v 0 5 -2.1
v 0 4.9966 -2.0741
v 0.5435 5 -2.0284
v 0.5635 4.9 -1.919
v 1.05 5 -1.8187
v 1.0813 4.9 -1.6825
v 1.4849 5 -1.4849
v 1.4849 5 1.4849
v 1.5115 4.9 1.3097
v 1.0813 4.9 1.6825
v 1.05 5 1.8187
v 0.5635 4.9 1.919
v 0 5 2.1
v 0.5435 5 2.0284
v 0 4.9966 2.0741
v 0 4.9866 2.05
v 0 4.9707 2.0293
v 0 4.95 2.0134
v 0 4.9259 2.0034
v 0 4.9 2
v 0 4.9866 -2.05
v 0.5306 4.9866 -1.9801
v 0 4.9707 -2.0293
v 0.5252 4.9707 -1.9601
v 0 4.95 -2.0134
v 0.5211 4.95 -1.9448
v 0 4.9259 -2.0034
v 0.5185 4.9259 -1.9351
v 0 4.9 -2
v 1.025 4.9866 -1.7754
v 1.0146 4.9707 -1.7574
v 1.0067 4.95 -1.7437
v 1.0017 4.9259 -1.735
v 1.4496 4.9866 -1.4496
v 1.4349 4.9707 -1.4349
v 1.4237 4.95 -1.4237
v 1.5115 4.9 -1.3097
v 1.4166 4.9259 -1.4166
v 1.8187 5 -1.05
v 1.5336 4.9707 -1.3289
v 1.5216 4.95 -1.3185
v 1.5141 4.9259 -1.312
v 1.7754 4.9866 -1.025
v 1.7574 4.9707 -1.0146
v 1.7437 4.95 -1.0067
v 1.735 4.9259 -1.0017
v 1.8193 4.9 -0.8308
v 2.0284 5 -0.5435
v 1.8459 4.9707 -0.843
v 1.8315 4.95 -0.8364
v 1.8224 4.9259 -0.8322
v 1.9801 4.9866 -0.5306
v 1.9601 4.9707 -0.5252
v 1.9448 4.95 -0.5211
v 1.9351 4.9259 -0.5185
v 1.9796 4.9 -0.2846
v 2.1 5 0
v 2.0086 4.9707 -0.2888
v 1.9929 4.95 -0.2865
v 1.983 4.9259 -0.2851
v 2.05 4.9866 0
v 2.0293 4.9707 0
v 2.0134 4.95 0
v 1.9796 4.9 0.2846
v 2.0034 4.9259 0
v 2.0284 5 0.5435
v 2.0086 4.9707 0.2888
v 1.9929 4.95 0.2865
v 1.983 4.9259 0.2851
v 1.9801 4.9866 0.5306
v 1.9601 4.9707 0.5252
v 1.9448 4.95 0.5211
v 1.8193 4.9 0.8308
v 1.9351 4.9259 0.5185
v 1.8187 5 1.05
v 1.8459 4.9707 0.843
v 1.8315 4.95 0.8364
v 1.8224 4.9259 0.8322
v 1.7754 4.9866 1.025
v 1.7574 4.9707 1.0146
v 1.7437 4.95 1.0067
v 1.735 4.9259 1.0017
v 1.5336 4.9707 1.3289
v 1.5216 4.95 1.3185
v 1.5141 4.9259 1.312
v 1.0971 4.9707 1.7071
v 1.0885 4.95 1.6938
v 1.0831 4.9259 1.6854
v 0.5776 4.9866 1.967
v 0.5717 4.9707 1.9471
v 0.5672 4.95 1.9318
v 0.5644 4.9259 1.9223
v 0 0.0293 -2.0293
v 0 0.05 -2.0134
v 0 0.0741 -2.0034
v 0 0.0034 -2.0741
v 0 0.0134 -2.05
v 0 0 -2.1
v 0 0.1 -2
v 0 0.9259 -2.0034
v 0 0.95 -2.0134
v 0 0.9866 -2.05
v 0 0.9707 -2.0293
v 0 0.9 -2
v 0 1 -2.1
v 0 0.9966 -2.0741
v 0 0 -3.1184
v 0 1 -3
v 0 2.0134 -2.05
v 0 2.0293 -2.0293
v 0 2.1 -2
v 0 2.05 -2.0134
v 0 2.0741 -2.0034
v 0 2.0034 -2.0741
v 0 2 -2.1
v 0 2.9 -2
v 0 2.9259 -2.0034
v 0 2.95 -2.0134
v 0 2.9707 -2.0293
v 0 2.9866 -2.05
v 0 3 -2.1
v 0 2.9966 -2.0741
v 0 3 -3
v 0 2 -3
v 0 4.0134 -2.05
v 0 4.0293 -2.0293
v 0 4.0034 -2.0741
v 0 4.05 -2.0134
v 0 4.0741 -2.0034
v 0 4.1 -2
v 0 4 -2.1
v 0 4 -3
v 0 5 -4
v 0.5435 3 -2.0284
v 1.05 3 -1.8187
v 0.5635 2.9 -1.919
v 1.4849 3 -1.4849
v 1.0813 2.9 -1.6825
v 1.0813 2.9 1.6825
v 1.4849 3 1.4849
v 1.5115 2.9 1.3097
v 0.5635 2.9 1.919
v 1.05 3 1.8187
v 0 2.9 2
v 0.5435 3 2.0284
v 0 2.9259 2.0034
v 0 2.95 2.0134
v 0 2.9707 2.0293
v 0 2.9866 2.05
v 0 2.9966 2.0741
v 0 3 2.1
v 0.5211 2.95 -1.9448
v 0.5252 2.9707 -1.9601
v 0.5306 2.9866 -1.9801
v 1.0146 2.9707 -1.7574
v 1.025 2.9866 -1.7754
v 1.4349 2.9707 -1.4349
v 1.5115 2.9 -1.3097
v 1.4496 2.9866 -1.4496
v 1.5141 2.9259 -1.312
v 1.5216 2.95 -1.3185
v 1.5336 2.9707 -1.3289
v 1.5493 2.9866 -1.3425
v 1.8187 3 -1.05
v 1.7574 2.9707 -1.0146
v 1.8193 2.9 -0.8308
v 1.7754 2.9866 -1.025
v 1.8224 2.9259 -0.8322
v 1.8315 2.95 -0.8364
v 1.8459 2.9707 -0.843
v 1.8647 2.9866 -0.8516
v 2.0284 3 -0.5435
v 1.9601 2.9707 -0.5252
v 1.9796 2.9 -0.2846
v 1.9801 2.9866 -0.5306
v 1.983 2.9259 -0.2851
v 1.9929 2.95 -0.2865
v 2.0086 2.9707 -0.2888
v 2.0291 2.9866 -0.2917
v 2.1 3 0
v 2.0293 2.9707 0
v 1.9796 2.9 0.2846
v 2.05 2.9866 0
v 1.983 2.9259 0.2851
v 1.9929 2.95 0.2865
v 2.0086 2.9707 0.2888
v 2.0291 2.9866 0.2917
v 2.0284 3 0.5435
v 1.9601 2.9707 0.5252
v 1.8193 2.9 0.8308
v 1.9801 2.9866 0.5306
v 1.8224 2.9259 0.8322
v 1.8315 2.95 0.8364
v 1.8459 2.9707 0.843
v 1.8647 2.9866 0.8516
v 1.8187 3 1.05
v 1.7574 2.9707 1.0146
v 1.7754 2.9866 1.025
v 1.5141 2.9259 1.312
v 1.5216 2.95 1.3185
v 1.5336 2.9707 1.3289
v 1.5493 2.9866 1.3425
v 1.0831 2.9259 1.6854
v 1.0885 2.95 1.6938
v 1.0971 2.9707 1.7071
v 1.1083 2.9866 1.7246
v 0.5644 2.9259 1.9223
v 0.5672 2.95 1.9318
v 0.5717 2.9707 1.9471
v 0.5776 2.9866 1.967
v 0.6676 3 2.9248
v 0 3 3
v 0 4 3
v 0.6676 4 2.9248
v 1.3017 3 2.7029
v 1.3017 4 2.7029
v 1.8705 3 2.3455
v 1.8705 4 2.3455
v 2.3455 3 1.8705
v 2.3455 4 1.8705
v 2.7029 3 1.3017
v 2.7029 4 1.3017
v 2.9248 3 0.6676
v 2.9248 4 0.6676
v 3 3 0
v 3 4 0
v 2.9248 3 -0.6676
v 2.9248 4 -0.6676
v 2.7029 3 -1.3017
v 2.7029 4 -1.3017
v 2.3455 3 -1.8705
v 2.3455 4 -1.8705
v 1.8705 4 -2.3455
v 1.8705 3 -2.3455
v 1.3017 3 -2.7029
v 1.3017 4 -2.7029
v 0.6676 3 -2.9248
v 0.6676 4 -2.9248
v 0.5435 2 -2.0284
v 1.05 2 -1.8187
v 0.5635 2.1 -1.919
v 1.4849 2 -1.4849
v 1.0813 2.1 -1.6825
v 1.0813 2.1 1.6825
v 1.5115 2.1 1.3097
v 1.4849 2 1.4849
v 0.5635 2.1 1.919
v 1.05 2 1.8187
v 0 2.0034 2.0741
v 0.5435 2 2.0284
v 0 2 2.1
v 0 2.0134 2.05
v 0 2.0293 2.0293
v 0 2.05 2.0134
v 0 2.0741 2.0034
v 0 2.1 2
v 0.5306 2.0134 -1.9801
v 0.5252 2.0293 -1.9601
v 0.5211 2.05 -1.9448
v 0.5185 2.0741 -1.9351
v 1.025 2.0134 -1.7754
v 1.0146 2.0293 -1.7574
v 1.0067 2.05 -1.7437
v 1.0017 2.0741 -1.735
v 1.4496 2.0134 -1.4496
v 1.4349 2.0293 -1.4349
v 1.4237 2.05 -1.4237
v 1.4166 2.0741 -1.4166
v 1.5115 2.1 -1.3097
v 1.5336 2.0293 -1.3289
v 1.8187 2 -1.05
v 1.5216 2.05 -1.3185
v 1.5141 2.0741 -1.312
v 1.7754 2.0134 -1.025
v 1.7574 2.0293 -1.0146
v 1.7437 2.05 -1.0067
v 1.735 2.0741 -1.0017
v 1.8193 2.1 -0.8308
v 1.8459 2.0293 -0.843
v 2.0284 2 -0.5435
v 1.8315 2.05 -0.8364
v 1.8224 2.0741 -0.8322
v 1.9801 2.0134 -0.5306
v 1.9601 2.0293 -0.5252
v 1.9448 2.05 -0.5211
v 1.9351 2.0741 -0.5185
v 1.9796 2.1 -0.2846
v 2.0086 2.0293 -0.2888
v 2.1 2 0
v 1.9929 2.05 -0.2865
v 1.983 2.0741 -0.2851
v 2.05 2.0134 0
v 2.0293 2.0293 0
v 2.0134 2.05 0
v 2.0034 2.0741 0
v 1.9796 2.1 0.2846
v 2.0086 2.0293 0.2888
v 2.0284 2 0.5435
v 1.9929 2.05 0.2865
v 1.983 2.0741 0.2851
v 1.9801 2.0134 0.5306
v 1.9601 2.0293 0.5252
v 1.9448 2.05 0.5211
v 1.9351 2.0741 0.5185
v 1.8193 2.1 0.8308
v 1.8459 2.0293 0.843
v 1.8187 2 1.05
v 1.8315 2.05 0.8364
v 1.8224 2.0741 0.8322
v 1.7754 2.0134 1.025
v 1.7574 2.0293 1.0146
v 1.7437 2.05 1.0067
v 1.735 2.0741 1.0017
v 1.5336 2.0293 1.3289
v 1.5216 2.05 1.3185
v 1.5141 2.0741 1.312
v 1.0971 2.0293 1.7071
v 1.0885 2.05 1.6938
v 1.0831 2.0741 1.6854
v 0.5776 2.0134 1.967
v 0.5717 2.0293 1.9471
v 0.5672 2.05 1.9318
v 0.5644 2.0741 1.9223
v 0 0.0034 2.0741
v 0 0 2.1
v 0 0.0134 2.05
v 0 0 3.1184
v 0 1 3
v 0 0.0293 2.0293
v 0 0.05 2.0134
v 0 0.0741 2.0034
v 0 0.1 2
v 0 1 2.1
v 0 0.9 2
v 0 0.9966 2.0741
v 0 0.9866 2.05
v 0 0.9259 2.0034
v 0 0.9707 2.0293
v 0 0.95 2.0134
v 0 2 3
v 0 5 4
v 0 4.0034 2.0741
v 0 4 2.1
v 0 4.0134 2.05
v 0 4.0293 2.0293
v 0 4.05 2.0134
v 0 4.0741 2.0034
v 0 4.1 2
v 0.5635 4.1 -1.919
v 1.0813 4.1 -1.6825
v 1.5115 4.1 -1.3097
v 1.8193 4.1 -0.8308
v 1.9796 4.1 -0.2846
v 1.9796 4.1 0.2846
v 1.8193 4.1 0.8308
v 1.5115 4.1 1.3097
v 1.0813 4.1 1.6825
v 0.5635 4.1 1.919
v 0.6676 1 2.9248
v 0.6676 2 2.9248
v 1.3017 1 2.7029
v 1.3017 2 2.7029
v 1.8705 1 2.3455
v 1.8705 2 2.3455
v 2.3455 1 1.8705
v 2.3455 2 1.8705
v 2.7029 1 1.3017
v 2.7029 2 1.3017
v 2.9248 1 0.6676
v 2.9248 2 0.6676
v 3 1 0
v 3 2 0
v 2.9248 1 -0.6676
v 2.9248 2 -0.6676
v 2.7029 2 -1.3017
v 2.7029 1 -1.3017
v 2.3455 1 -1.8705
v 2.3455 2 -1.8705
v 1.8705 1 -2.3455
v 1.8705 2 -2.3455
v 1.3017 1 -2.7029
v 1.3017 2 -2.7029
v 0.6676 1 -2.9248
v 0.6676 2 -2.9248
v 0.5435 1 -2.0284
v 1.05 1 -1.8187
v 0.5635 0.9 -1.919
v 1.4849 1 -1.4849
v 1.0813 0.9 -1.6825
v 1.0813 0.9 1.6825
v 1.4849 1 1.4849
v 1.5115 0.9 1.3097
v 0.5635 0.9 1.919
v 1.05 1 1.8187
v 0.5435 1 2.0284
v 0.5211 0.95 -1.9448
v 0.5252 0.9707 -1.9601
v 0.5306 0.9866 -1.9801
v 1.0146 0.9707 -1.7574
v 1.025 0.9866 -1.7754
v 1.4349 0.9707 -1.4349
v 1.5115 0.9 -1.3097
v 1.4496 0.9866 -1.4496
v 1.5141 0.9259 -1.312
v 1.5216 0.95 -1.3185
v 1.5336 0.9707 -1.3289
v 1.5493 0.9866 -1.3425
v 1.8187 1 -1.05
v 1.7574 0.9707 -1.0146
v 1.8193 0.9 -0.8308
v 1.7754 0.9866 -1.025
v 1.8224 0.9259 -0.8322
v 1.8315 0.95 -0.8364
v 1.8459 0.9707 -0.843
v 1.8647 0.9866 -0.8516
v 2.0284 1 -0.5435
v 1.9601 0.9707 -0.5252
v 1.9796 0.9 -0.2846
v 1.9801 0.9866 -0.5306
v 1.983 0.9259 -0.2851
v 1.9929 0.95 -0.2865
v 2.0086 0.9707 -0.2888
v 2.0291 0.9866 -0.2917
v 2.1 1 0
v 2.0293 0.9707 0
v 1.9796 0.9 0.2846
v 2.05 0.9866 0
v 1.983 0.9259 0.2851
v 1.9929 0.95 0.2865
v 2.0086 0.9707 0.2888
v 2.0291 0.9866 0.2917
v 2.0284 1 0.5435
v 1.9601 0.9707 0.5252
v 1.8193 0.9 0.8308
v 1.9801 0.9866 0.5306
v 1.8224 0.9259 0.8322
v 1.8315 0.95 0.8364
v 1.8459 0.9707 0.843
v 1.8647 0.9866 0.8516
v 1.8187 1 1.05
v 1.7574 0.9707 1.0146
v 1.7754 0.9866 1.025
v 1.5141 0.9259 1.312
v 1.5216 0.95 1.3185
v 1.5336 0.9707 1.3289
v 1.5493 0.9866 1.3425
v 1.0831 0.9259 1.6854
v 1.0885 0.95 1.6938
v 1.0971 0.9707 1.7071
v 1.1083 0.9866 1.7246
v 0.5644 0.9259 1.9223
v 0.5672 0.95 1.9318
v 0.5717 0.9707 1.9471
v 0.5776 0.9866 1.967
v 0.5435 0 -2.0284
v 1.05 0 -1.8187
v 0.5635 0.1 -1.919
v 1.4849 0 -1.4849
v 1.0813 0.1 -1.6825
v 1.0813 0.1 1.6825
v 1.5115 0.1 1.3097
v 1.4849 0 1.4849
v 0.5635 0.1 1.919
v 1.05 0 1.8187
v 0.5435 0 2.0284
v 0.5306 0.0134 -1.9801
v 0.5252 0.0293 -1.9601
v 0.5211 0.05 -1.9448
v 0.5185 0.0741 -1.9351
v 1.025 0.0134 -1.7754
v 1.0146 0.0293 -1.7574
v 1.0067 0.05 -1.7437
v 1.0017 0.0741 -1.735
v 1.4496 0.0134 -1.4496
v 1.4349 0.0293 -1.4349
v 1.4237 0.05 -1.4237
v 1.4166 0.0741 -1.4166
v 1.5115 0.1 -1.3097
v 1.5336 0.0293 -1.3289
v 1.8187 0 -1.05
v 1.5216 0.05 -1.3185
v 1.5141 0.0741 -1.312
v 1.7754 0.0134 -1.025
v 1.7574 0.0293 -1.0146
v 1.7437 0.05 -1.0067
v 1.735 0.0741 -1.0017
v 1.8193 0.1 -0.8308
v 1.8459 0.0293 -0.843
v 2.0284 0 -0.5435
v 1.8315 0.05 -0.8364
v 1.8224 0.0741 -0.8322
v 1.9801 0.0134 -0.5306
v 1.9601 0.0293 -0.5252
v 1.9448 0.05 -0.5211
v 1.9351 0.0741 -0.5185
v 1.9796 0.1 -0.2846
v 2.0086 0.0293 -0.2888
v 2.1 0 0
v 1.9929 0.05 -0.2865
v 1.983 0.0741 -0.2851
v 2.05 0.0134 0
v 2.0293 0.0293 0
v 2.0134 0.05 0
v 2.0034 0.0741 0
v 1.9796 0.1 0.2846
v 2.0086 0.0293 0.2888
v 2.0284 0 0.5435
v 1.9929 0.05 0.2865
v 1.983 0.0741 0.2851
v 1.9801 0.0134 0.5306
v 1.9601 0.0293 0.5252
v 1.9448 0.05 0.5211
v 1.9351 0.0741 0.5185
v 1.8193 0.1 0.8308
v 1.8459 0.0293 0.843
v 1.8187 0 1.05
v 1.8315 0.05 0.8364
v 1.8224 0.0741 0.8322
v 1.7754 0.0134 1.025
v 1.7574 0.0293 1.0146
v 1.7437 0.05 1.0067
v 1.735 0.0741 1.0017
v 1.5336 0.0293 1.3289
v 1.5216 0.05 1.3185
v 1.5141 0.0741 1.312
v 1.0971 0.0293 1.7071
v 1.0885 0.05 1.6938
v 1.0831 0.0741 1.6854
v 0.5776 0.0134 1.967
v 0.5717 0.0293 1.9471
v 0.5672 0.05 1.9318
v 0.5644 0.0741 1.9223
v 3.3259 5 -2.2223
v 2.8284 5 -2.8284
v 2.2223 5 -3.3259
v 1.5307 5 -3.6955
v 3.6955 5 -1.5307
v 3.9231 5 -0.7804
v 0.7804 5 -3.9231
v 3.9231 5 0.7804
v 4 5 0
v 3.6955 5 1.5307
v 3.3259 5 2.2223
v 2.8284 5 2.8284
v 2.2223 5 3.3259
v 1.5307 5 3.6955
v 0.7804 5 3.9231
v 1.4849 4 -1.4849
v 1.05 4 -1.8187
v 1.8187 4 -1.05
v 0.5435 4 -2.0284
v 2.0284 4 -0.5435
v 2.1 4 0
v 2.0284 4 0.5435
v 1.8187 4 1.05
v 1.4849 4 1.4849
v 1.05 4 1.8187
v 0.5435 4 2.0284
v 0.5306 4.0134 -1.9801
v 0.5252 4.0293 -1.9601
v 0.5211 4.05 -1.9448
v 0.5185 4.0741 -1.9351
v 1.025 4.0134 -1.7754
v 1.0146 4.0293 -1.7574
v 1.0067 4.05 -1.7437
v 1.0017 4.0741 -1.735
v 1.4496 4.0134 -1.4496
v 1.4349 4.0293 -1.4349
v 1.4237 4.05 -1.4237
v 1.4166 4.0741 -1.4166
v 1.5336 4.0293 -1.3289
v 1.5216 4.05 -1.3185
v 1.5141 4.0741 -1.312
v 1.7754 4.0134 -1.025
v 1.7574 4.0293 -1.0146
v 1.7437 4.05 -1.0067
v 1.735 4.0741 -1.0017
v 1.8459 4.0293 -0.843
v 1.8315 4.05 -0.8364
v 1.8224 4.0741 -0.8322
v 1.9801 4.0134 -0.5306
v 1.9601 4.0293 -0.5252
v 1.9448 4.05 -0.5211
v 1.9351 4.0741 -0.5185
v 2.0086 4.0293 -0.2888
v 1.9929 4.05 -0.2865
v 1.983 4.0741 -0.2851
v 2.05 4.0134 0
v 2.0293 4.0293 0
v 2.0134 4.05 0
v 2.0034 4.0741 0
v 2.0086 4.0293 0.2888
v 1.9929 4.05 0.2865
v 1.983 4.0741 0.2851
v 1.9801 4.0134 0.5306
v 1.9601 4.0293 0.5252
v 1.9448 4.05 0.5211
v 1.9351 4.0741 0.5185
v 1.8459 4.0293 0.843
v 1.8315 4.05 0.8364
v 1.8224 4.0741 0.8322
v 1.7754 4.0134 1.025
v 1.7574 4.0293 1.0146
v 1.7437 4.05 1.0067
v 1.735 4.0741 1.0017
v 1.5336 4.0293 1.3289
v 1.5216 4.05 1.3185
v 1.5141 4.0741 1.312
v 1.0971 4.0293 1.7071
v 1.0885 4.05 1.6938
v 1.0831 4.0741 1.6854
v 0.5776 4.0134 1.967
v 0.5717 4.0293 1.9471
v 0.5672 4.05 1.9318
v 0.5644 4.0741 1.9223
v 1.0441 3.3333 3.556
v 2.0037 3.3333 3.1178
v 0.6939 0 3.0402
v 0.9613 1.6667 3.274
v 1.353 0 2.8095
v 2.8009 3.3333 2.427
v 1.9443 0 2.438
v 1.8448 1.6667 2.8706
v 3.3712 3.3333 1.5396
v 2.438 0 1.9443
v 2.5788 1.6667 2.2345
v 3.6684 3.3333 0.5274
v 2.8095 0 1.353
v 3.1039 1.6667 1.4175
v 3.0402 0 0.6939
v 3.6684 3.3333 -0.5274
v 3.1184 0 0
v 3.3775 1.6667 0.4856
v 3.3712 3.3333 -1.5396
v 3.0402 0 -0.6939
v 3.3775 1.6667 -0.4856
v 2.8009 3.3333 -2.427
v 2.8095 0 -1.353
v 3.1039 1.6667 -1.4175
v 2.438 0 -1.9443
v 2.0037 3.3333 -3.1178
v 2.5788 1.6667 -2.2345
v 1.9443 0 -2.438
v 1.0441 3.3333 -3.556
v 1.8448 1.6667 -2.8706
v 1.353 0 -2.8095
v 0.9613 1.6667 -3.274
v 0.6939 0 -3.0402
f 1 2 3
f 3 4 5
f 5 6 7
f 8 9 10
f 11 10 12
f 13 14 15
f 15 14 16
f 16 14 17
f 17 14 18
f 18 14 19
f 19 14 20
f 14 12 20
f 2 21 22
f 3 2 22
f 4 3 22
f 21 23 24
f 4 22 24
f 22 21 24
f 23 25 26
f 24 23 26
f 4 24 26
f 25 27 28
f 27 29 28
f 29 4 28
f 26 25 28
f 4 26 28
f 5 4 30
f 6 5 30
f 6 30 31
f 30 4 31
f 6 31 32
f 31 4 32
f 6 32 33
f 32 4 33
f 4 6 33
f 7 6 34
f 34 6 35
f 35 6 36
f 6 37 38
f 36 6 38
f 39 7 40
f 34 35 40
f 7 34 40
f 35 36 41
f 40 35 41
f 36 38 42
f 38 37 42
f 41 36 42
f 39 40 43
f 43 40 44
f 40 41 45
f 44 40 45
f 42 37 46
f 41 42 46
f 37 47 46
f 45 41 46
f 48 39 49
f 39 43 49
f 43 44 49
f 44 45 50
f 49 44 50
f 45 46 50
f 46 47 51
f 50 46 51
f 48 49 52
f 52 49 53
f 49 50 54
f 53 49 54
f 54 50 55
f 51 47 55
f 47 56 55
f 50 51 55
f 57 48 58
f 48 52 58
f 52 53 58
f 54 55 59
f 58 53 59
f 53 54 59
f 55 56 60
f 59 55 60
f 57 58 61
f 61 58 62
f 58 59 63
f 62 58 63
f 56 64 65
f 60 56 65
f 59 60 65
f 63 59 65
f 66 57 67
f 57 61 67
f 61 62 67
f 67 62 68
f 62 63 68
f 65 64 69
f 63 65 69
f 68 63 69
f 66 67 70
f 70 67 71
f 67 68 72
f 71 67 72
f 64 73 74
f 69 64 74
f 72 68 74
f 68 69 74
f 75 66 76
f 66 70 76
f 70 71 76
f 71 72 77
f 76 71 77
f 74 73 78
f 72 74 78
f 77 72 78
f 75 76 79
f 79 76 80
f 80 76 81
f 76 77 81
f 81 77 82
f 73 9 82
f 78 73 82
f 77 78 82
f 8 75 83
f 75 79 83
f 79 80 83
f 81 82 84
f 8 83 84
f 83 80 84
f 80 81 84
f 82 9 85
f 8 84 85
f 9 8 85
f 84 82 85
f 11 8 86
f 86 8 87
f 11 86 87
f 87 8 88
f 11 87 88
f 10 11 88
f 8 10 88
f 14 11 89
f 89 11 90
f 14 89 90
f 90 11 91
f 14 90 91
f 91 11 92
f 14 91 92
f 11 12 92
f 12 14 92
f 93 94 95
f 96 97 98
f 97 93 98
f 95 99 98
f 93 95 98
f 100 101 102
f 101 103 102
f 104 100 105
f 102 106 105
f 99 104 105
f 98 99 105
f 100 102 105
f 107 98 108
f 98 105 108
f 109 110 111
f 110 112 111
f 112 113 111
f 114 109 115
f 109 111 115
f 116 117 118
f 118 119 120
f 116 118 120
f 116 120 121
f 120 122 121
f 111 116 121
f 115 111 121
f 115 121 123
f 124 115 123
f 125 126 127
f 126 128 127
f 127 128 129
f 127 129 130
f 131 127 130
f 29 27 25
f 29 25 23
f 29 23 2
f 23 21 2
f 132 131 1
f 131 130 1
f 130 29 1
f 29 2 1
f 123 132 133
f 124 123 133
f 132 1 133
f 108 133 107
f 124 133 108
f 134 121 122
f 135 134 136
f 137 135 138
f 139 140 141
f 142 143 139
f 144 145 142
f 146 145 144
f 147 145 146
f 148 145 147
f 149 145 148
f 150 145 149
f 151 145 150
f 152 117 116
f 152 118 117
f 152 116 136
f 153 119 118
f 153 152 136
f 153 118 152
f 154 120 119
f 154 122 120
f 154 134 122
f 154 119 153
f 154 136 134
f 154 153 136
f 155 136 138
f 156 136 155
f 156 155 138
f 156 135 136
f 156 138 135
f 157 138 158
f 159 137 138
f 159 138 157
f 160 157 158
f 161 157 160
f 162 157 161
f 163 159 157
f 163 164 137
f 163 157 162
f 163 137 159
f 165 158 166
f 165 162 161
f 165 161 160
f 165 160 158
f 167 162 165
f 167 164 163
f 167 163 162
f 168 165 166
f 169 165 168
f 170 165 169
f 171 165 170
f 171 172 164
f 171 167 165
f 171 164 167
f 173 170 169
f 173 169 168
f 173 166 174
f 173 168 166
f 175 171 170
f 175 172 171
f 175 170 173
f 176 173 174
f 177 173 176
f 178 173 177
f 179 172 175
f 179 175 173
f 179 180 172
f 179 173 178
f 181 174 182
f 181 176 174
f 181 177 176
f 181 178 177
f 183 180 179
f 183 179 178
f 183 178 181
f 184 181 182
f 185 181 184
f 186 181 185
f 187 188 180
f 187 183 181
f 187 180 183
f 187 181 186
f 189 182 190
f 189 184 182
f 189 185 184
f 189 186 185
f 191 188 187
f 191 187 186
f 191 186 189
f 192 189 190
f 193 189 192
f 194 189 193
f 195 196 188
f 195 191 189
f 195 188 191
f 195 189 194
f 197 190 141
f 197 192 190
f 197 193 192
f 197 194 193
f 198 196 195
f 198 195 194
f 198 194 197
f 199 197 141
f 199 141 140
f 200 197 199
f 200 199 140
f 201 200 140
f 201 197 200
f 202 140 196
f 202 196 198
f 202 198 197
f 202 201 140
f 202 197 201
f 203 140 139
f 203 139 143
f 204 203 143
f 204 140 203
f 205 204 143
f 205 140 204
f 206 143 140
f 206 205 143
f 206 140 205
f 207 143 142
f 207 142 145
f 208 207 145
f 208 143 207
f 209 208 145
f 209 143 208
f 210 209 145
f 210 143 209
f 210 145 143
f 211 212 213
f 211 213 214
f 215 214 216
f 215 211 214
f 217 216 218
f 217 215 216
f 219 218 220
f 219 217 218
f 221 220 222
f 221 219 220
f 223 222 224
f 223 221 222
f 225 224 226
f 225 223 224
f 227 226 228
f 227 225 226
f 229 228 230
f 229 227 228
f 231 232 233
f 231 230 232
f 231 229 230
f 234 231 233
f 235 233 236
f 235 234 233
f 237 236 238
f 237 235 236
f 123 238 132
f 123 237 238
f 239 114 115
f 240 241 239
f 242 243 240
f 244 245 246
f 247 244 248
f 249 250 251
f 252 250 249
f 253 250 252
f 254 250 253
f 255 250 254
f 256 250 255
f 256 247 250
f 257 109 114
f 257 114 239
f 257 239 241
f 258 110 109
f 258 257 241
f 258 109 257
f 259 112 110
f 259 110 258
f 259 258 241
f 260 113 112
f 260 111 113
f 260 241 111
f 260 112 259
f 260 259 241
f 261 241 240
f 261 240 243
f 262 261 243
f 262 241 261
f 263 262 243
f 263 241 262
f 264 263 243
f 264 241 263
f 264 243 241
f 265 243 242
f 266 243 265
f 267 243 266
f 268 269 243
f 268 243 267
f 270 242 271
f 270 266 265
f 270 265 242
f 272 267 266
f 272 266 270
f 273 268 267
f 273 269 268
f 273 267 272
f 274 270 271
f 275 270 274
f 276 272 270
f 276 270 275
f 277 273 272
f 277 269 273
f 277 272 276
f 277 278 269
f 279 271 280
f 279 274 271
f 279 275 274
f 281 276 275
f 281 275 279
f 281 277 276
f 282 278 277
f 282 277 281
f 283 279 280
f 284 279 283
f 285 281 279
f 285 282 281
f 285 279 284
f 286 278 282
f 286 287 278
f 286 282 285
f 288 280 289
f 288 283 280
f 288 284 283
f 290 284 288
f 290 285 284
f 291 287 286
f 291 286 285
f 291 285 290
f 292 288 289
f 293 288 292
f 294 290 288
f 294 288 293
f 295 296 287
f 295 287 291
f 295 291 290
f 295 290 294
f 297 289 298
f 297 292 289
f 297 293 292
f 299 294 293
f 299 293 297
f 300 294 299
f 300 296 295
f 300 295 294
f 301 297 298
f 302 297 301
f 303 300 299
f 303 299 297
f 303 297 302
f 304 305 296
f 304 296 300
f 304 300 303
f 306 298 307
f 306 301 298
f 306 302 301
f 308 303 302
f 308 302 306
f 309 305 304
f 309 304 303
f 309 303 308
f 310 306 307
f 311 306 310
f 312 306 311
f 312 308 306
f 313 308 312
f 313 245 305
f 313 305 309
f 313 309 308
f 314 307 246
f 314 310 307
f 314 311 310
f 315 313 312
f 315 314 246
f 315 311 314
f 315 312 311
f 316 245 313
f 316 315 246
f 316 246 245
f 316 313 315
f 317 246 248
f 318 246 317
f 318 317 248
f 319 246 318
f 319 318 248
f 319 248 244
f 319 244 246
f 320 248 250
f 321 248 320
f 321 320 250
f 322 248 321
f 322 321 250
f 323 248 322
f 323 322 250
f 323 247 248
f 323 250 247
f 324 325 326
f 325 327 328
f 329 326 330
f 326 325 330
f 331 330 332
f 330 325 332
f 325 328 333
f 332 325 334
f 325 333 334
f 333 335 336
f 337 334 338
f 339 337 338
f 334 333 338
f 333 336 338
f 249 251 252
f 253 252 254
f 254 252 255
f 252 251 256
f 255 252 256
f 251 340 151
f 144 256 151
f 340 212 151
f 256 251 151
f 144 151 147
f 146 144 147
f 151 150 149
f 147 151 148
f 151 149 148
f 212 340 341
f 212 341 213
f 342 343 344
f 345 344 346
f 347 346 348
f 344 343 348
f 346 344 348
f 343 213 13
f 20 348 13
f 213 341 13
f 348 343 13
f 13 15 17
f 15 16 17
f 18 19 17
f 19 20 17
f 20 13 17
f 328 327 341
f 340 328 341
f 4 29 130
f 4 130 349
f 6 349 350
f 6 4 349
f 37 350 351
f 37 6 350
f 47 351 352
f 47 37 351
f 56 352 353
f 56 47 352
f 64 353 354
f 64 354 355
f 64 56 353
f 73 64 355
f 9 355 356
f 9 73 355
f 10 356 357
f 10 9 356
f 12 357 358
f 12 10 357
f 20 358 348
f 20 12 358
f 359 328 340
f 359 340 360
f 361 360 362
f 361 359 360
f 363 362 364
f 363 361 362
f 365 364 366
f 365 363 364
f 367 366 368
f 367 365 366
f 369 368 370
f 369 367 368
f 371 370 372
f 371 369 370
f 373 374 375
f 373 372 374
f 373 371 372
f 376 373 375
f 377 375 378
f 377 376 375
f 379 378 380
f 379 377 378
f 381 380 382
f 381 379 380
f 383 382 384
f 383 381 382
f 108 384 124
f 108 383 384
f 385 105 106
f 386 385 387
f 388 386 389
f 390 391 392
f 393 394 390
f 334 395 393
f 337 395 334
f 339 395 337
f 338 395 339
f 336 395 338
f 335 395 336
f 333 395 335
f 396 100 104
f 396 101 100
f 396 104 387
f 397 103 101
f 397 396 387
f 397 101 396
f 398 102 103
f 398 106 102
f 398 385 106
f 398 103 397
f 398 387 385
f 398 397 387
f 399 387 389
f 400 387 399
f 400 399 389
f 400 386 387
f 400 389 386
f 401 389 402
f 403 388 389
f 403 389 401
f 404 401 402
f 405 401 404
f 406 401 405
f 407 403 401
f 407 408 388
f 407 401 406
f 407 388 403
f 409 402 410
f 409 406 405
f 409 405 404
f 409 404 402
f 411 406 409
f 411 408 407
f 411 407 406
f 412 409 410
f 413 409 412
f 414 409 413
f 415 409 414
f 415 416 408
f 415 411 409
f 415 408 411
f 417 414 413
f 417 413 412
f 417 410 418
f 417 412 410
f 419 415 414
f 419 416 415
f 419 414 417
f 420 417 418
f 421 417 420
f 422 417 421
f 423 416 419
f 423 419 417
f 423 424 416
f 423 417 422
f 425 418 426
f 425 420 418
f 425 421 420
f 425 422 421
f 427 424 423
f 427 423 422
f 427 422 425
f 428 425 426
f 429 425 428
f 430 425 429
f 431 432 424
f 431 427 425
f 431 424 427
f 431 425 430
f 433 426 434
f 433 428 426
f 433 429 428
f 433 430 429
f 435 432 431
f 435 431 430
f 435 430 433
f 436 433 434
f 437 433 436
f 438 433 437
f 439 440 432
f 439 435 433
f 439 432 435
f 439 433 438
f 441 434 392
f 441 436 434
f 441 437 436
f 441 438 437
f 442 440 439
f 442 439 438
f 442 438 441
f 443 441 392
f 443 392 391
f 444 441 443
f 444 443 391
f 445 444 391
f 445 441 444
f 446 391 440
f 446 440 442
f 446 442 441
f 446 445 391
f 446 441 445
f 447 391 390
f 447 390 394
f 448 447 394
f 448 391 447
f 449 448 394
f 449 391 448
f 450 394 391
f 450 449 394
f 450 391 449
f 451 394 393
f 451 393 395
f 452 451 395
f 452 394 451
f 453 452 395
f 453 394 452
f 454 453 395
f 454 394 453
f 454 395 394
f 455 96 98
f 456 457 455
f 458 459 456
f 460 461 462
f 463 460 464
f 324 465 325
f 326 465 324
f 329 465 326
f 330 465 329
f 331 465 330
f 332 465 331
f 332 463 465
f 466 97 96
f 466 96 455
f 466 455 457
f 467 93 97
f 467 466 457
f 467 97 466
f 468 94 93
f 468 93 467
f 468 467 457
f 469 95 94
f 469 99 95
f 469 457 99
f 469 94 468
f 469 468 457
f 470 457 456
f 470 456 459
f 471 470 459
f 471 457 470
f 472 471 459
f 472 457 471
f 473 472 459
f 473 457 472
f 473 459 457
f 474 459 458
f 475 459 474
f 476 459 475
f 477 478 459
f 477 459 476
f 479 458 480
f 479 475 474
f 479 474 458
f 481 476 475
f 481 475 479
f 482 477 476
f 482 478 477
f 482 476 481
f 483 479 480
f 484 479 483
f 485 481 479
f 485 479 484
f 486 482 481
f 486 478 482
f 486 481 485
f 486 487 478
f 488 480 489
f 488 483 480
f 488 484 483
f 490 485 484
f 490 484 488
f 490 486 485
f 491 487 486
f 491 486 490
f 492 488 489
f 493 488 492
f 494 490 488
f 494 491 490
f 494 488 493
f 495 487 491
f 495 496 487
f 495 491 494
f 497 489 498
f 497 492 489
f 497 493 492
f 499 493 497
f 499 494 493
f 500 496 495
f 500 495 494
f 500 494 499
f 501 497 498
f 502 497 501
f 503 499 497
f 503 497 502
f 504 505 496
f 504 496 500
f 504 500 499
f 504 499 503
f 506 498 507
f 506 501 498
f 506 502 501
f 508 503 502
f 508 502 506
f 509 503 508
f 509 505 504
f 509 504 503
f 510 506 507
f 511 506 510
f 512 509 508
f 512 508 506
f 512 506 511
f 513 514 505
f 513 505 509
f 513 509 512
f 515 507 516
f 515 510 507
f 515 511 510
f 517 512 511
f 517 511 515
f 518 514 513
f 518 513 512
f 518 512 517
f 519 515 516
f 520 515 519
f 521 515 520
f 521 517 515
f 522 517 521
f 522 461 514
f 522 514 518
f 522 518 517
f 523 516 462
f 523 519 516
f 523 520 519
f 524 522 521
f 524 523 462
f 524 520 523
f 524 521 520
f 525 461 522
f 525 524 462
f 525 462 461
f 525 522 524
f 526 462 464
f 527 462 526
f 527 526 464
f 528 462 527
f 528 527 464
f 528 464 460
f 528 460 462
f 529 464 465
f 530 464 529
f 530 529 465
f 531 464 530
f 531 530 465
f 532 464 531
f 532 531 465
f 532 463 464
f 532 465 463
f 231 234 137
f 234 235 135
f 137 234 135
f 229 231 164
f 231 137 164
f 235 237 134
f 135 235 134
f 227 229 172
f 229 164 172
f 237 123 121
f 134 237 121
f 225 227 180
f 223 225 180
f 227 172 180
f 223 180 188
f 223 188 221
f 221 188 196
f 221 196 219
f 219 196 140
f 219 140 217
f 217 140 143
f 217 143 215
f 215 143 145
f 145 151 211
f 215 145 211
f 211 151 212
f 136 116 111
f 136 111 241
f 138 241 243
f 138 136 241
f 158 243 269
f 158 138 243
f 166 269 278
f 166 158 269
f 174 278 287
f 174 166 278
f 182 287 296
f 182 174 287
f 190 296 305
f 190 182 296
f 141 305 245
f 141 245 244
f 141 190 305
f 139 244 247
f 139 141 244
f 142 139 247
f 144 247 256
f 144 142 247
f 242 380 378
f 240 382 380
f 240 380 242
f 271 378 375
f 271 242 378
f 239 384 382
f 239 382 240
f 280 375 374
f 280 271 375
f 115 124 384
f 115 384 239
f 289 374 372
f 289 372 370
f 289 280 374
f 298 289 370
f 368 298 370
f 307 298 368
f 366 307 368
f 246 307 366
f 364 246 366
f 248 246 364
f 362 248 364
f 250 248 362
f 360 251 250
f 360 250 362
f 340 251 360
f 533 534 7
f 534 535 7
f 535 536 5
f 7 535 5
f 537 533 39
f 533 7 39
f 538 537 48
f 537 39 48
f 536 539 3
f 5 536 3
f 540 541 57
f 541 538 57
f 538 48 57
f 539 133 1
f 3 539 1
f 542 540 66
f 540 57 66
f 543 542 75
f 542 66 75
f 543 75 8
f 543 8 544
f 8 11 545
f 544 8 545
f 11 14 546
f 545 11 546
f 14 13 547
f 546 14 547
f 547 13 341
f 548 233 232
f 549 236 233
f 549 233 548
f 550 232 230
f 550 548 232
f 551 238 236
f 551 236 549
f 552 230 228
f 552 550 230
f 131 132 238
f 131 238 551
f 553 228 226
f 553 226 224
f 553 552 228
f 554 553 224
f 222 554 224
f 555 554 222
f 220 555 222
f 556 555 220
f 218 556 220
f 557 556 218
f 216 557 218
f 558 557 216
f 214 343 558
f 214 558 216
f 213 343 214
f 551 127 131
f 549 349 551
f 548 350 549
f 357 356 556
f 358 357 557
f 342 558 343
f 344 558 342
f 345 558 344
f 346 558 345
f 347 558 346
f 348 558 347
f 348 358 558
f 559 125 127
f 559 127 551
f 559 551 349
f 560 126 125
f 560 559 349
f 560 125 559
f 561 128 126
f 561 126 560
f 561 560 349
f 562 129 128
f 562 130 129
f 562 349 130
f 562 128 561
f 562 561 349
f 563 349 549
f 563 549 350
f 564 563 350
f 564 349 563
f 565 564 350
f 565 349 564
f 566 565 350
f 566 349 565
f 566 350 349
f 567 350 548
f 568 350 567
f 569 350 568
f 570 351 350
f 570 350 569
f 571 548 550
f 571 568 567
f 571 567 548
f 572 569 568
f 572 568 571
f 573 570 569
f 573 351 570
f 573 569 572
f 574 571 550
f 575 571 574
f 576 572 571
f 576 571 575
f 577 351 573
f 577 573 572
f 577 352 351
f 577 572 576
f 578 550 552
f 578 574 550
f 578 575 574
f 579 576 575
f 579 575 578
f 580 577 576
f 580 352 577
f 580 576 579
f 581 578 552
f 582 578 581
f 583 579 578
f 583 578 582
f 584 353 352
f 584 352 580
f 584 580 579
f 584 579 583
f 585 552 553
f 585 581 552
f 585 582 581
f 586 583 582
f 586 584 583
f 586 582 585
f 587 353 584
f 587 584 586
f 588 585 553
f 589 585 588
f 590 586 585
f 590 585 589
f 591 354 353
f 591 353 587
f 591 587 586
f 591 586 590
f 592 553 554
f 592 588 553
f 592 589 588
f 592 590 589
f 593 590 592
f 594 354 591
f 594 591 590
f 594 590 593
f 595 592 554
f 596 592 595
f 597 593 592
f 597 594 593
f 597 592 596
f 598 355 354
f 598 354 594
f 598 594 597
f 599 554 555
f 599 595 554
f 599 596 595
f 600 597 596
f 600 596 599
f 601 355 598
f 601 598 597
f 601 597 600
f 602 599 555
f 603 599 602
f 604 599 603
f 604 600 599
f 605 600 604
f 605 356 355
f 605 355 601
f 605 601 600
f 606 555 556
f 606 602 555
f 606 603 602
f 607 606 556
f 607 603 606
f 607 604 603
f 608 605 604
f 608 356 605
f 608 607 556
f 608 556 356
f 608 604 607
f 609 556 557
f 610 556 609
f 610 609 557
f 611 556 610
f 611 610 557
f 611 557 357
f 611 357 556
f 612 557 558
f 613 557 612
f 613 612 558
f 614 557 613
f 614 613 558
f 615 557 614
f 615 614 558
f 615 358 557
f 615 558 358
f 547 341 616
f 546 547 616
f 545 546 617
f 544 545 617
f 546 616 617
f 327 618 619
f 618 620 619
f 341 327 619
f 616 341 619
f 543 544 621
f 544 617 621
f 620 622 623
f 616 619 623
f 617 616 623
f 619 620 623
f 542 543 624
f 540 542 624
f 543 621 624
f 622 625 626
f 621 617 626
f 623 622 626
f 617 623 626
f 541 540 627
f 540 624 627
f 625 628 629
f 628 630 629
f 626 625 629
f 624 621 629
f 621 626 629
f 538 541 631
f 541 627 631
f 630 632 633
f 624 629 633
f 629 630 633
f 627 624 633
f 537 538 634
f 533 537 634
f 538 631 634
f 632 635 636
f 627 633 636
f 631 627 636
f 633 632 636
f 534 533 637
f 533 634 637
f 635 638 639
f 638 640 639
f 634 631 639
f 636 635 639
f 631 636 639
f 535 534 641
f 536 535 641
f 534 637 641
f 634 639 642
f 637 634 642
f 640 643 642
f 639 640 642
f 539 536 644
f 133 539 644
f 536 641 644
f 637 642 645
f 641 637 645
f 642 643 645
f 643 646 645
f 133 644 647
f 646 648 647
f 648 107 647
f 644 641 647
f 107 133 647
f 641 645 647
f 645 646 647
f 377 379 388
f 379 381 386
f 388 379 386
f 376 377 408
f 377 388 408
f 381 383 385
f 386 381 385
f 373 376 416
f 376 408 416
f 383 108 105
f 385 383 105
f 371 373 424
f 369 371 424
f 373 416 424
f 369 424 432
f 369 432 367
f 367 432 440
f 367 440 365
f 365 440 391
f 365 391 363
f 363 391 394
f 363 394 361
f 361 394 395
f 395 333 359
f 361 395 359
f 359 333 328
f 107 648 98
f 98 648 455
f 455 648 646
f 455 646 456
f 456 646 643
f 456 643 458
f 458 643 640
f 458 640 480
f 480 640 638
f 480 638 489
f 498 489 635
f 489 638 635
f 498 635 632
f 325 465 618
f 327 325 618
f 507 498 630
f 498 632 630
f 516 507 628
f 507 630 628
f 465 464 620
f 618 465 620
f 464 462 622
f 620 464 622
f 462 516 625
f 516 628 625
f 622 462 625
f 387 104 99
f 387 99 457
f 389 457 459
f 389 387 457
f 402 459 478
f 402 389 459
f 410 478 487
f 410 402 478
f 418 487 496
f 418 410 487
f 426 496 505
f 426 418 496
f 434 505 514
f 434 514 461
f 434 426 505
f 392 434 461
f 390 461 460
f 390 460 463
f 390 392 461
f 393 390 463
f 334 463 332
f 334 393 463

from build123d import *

# Parameters (mm, degrees)
SKETCH1_R           = 4
SKETCH1_R_2         = 3
BOSS_EXTRUDE1_DEPTH = 5
SKETCH2_W           = 1
SKETCH2_H           = 1
FILLET1_R           = 0.1


# Read off the part's stored shape, not the designer's step: Cut-Revolve-Thin1, Body-Delete/Keep 1
with BuildPart() as part:
    # Sketch1 → Boss-Extrude1 (new body)
    with BuildSketch(Plane(origin=(0, 0, 0), x_dir=(1, 0, 0), z_dir=(0, 1, 0))):
        with Locations(Location((0, 0, 0), (0, 0, 270))):
            Circle(SKETCH1_R)
        with Locations(Location((0, 0, 0), (0, 0, 270))):
            Circle(SKETCH1_R_2, mode=Mode.SUBTRACT)
    extrude(amount=BOSS_EXTRUDE1_DEPTH)

    # Sketch2 → Revolve1 (revolve)
    with BuildSketch(Plane.XY, mode=Mode.PRIVATE) as revolve1_sk:
        with Locations((-2.5, 4.5)):
            Rectangle(SKETCH2_W, SKETCH2_H)
        with Locations((-2.5, 2.5)):
            Rectangle(SKETCH2_W, SKETCH2_H)
        with Locations((-2.5, 0.5)):
            Rectangle(SKETCH2_W, SKETCH2_H)
    revolve(revolve1_sk.sketch.rotate(Axis((0, 5, 0), (0, -1, 0)), 270), axis=Axis((0, 5, 0), (0, -1, 0)))

    # Cut-Revolve-Thin1 outline → Cut-Revolve-Thin1 (revolve, cut)
    with BuildSketch(Plane.XY):
        Polygon((3.118365096, 0), (3.219907758, 0), (4, 4.424122952), (4, 5), align=None)
    revolve(axis=Axis((0, 0, 0), (0, 1, 0)), mode=Mode.SUBTRACT)

    # Body-Delete/Keep 1 outline → Body-Delete/Keep 1 (revolve, cut)
    with BuildSketch(Plane.XY):
        Polygon((4, 4.424122952), (3.219907758, 0), (4, 0), align=None)
    revolve(axis=Axis((0, 0, 0), (0, 1, 0)), mode=Mode.SUBTRACT)

    # SurfaceCut1
    split(bisect_by=Plane(origin=(0, 0, 0), x_dir=(0, 0, -1), z_dir=(1, 0, 0)), keep=Keep.TOP)

    # Fillet1
    fillet1_edges = [part.edges().sort_by_distance(p)[0] for p in [
        (2, 0, 0),
        (2, 1, 0),
        (2, 4, 0),
        (2, 5, 0),
        (2, 3, 0),
        (2, 2, 0),
    ]]
    fillet(fillet1_edges, radius=FILLET1_R)


solid = part.part
